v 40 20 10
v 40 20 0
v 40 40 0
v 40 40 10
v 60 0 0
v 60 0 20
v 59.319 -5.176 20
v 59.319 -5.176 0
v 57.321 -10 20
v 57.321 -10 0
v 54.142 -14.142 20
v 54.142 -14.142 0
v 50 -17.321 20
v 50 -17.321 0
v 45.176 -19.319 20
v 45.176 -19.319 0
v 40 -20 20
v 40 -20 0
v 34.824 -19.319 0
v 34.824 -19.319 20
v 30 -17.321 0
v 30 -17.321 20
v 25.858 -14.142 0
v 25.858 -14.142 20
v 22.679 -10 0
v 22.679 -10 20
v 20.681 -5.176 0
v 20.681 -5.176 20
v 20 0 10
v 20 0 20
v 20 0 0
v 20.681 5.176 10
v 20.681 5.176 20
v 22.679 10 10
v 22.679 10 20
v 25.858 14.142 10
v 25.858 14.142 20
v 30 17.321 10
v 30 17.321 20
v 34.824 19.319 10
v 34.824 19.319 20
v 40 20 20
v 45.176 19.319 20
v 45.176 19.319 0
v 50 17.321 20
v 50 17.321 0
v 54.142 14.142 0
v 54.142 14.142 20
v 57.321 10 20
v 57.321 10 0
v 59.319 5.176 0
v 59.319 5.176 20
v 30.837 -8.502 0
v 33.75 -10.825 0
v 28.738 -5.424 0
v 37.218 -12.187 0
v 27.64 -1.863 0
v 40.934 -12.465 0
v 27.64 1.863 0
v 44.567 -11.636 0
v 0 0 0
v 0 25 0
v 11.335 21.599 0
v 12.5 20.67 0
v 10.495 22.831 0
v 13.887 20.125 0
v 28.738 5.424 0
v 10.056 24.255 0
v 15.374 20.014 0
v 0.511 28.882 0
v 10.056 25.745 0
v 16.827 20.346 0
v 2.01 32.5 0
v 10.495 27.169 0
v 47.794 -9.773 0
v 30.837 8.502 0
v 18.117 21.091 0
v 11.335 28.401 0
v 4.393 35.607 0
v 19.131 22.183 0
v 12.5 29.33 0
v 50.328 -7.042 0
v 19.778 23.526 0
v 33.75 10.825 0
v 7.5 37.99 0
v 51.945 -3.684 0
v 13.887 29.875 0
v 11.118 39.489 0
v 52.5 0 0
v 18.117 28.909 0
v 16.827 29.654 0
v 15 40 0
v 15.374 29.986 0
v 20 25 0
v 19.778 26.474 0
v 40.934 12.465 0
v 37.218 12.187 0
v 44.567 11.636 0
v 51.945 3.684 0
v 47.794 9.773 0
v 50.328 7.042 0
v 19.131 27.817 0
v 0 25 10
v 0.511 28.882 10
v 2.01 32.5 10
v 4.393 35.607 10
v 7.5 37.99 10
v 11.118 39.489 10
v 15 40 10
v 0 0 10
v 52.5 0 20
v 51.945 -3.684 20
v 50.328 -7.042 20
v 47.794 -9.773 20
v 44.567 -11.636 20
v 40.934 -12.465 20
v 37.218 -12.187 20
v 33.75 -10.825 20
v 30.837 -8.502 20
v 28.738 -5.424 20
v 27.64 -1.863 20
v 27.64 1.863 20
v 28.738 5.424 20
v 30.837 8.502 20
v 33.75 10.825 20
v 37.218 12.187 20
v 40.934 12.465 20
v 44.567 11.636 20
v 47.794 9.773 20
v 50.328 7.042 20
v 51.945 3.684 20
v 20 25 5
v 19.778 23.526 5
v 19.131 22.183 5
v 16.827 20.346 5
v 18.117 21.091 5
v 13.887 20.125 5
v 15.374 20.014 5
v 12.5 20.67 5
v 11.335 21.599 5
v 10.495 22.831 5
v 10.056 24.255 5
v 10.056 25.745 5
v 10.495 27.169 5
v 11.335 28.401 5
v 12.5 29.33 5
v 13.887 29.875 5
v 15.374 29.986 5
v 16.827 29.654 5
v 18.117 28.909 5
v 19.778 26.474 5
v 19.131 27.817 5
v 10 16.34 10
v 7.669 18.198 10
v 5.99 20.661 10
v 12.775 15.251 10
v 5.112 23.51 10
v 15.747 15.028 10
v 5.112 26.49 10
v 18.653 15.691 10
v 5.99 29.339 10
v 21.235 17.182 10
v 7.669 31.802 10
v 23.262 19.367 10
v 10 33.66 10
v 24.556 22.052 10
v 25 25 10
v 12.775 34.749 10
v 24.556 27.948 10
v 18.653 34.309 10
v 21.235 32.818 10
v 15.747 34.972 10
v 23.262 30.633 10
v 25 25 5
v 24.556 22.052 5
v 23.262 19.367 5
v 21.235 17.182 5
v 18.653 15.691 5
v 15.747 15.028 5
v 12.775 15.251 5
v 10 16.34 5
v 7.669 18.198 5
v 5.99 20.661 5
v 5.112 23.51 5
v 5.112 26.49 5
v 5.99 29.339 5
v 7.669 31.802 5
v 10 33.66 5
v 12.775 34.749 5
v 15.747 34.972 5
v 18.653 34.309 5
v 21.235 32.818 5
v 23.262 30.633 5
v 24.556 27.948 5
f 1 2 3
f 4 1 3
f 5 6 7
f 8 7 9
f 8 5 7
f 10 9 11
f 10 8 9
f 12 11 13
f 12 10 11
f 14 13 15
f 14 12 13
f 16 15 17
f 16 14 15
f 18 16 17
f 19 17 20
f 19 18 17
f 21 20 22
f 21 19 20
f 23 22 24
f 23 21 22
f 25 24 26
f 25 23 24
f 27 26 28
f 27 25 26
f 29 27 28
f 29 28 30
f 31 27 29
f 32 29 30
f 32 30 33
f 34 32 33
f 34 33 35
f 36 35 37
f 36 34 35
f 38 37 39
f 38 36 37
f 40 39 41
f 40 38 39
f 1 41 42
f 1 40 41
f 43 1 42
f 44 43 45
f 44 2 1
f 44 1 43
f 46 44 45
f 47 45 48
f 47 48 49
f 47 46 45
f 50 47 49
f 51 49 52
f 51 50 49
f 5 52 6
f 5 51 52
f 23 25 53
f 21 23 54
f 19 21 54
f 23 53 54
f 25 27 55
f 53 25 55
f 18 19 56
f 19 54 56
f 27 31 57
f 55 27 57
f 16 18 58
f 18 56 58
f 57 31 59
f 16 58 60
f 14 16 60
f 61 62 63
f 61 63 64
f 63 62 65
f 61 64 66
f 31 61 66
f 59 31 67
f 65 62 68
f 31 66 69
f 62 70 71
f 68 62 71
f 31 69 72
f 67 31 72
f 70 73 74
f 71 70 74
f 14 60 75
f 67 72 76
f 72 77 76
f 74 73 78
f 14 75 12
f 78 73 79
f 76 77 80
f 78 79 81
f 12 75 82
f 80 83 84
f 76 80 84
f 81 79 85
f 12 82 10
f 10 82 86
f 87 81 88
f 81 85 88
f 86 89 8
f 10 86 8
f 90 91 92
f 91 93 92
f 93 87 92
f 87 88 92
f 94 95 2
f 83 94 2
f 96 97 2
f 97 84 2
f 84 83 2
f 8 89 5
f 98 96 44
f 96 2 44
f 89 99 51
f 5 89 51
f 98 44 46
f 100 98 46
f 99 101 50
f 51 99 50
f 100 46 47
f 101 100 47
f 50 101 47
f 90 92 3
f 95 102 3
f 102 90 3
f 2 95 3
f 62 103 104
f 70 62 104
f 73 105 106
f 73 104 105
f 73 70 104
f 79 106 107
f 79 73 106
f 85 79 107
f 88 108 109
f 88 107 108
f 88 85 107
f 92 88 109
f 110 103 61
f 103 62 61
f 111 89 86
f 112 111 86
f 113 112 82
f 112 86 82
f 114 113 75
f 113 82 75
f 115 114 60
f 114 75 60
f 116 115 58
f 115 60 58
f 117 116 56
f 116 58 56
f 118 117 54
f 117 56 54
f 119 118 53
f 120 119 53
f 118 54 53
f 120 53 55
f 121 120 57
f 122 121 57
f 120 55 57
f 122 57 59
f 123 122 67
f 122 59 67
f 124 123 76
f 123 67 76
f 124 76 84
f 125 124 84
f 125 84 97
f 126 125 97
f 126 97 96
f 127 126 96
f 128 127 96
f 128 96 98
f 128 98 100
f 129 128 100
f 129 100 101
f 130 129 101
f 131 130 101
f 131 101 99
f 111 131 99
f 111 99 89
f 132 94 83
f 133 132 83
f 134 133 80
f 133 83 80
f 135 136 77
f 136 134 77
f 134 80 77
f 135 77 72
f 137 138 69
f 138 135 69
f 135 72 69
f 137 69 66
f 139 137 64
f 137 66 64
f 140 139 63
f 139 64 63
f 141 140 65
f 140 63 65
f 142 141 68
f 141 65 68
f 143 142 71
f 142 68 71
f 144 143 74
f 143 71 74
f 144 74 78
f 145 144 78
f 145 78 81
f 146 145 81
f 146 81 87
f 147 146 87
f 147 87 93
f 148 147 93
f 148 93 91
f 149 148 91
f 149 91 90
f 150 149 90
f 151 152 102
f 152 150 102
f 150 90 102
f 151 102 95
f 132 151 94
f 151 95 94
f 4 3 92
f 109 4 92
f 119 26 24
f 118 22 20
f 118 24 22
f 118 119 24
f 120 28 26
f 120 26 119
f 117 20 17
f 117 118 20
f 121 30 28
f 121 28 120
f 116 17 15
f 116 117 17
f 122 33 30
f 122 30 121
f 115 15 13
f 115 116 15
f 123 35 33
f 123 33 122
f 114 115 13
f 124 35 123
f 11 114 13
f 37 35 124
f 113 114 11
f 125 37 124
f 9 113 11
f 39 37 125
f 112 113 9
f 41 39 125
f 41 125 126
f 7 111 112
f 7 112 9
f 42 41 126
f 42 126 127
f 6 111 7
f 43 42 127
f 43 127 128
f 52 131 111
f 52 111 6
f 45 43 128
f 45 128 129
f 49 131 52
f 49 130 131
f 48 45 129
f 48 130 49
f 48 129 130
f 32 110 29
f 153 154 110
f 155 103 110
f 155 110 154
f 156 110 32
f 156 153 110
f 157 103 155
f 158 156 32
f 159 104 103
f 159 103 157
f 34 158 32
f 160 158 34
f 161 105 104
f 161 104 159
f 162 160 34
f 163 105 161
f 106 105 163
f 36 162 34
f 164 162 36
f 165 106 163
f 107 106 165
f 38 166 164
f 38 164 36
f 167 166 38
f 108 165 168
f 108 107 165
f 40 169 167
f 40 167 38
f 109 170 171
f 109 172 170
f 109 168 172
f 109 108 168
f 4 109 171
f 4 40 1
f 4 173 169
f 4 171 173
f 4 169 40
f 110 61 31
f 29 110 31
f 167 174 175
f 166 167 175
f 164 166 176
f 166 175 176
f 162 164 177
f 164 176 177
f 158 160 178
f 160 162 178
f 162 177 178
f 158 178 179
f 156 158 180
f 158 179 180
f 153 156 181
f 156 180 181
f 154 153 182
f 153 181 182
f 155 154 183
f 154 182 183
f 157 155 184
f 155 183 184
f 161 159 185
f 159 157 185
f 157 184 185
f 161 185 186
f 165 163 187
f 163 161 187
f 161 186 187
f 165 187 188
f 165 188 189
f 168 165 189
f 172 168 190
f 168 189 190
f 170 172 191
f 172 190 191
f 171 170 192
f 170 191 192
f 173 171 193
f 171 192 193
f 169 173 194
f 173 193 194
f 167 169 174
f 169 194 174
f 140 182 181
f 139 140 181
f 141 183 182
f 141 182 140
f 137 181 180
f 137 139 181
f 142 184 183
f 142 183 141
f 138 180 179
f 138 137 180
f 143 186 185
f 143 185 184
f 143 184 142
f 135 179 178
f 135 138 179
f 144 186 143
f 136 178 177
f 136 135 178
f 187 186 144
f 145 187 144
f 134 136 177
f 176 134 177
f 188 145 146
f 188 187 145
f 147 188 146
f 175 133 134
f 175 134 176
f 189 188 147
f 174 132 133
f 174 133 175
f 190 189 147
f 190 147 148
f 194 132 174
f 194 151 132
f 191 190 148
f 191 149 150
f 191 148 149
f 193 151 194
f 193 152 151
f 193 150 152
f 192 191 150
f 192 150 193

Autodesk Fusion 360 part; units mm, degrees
sketch "스케치1" plane through (0, 0, 0) normal (0, 0, 1) x (1, 0, 0)
  line L0 (0, 0) -> (40, 0)
  line L1 (40, 0) -> (40, 40)
  line L2 (40, 40) -> (15, 40)
  line L3 (0, 25) -> (0, 0)
  circle A0 centre (40, 0) radius 20
  circle A1 centre (40, 0) radius 12.5
  arc A2 (15, 40) -> (0, 25) centre (15, 25) ccw
  circle A3 centre (15, 25) radius 10
  circle A4 centre (15, 25) radius 5
  point P0 (0, 40)
  dimension "d1" = 40
  dimension "d2" = 40
  dimension "d3" = 40
  dimension "d4" = 25
  dimension "d5" = 15
  dimension "d6" = 20
  dimension "d7" = 10
extrude "돌출4" add sketch "스케치1" along normal blind 20 contours L0 L1 A0 A1 | L0 L1 A0 A1
extrude "돌출5" add sketch "스케치1" along normal blind 10 contours L0 L1 L2 L3 A0 A2
extrude "돌출6" add sketch "스케치1" along normal blind 5 contours A3
